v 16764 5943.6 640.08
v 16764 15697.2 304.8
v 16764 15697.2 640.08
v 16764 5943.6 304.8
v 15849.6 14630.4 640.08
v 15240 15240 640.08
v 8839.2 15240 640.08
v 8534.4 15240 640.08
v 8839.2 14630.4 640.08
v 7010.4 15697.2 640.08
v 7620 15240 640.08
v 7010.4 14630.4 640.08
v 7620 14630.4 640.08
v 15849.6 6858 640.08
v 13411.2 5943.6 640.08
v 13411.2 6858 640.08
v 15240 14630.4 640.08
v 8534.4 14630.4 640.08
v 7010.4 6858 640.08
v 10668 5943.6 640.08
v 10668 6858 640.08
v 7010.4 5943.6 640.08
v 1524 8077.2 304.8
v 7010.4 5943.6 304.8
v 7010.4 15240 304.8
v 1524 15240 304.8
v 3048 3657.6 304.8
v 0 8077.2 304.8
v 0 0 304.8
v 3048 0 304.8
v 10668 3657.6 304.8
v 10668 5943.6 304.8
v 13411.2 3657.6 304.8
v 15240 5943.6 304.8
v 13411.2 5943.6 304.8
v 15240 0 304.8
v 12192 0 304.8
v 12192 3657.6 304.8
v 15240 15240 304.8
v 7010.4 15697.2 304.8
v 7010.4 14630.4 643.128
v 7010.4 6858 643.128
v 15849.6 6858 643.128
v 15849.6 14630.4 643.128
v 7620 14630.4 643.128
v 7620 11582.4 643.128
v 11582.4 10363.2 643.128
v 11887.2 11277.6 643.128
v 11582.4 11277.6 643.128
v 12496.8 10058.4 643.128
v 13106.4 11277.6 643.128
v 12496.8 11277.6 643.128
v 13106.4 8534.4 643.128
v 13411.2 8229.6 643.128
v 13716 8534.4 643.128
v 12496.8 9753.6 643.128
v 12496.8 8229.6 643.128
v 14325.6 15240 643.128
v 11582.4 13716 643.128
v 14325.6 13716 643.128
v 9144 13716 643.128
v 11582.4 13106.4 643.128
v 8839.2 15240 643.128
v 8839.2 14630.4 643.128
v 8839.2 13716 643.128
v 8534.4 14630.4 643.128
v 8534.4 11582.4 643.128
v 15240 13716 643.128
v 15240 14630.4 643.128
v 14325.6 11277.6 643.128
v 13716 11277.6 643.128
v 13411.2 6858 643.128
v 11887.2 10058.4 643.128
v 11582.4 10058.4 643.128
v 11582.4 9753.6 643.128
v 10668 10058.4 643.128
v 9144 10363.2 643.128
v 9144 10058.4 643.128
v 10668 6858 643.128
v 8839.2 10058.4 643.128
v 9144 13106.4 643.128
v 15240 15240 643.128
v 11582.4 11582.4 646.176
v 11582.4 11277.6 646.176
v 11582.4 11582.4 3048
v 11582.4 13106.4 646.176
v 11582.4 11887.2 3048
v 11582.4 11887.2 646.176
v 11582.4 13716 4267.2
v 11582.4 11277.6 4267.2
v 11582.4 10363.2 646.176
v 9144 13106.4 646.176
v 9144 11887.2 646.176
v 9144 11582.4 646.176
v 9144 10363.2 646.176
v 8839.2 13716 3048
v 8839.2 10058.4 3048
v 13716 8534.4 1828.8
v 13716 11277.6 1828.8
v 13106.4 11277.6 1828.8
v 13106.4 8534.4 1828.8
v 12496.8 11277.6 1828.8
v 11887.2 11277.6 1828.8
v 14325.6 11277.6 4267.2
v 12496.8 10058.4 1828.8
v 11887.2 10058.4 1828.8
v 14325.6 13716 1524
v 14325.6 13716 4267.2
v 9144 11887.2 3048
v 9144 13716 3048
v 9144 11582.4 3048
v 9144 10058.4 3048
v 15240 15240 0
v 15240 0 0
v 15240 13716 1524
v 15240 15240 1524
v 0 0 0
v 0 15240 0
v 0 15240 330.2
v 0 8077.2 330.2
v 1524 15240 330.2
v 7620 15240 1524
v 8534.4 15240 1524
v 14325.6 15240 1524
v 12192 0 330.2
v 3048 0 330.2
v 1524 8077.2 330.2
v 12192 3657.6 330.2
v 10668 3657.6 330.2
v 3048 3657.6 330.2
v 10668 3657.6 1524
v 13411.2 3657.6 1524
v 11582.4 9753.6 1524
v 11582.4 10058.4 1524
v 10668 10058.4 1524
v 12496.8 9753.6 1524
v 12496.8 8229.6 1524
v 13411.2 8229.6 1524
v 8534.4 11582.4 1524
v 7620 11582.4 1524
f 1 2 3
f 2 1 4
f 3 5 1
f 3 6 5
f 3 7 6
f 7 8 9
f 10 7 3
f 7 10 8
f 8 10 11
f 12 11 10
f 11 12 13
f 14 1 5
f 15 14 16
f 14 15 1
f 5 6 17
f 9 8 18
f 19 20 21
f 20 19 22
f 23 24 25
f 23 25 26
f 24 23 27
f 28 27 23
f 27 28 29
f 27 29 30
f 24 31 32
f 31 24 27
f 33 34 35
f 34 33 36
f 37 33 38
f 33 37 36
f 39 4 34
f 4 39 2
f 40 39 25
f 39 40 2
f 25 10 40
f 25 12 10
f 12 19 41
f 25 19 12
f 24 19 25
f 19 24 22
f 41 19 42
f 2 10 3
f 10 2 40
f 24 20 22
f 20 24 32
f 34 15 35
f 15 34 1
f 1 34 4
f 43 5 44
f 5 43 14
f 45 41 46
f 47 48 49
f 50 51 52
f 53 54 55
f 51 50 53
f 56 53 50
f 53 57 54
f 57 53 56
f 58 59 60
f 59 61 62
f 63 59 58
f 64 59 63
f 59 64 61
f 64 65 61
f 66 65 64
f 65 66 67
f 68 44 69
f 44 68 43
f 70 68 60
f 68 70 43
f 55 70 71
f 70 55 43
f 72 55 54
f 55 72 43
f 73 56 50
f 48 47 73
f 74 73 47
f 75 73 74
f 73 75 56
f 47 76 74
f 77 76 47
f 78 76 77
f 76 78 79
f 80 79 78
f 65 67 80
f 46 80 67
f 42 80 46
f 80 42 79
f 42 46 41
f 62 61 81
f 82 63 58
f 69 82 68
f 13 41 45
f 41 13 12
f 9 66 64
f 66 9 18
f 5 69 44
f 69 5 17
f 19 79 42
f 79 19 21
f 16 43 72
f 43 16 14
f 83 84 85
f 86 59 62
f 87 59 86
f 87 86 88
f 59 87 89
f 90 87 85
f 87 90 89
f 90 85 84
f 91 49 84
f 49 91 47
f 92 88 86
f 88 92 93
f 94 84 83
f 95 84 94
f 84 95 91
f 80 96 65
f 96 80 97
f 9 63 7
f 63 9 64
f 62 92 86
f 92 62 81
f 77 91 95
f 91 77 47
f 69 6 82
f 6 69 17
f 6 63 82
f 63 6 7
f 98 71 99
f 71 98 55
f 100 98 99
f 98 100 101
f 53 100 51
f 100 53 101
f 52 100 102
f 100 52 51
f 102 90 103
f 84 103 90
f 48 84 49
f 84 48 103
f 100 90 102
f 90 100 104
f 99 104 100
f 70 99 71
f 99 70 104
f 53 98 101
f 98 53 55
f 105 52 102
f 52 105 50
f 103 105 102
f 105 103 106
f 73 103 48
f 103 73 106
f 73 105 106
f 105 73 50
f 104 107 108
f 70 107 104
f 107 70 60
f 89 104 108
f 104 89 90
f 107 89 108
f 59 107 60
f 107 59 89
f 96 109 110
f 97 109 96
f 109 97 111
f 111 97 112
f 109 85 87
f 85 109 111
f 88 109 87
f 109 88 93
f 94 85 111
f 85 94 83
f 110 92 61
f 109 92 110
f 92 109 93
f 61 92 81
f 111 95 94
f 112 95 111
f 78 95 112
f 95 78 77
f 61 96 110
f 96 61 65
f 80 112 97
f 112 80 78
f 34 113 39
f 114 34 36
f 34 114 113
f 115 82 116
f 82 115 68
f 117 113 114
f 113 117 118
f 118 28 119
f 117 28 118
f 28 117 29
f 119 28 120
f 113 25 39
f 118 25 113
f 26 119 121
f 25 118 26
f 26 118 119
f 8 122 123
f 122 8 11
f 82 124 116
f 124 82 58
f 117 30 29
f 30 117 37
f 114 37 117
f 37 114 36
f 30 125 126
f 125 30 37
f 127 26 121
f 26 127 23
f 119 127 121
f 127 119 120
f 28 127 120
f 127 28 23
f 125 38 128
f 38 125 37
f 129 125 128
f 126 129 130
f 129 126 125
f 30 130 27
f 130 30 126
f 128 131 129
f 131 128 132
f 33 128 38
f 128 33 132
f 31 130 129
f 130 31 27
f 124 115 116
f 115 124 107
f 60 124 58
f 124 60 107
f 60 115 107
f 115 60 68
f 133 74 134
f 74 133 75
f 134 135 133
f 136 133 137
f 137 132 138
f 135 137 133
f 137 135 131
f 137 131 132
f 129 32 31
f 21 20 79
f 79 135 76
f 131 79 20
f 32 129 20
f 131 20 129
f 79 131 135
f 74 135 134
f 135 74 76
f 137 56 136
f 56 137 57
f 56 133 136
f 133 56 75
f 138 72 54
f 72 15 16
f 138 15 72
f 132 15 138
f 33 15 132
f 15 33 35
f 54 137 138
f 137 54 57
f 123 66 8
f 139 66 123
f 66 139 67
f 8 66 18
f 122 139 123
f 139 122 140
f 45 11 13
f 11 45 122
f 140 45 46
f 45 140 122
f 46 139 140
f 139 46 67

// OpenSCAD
foot = 25.4*12;

color("green")
cube([foot*50,foot*50,foot]);

//garage
translate([0,foot*26.5,25.4]){
color("white")
cube([foot*5,foot*23.5,foot]);
}

//patio
translate([foot*10,0,25.4]){
color("brown")
cube([foot*30,foot*12,foot]);
}

translate([foot*47,foot*45,0])
cube([foot*3, foot*5, foot*5]);

translate([foot*35,foot*12,0])
color("brown")
cube([foot*3, foot*21, foot*5]);

translate([foot*38,foot*12,0])
color("yellow")
cube([foot*3, foot*20, foot*5]);

translate([foot*41,foot*12,0])
color("cyan")
cube([foot*3, foot*15, foot*5]);

translate([foot*25,foot*38,0])
color("pink")
cube([foot*3, foot*12, foot*5]);
    

translate([foot*29, foot*33,0]){
    
    translate([-foot*6,foot*-13.5, foot])
    color("blue")
    cube([foot*32, foot*32, foot*1.1]);
    
    translate([-foot*6,foot*-10.5, foot])
    color("red")
    cube([foot*29, foot*25.5, foot*1.11]);
    
    translate([0,foot*1, foot])
    color("purple")
    cube([foot*9, foot*9, foot*1.12]);
    
    translate([0,-foot*7, foot])
    color("orange")
    cube([foot*21, foot*24, foot*1.11]);
    
    //slide
    translate([foot*14, -foot*5, foot])
    cube([foot*2,foot*9,foot*5]);
    
    //ladder
    translate([foot*10,0, foot])
    cube([foot*2,foot*4,foot*5]);
    
    //club house
    translate([foot*9, foot*4, foot]){
        cube([foot*9, foot*8,foot*13]);
    }
    //swings
    translate([0,foot*5,foot])
    cube([foot*10, foot,foot*9]);
        translate([0,0,foot])
        cube([foot, foot*12,foot*9]);
   
}
